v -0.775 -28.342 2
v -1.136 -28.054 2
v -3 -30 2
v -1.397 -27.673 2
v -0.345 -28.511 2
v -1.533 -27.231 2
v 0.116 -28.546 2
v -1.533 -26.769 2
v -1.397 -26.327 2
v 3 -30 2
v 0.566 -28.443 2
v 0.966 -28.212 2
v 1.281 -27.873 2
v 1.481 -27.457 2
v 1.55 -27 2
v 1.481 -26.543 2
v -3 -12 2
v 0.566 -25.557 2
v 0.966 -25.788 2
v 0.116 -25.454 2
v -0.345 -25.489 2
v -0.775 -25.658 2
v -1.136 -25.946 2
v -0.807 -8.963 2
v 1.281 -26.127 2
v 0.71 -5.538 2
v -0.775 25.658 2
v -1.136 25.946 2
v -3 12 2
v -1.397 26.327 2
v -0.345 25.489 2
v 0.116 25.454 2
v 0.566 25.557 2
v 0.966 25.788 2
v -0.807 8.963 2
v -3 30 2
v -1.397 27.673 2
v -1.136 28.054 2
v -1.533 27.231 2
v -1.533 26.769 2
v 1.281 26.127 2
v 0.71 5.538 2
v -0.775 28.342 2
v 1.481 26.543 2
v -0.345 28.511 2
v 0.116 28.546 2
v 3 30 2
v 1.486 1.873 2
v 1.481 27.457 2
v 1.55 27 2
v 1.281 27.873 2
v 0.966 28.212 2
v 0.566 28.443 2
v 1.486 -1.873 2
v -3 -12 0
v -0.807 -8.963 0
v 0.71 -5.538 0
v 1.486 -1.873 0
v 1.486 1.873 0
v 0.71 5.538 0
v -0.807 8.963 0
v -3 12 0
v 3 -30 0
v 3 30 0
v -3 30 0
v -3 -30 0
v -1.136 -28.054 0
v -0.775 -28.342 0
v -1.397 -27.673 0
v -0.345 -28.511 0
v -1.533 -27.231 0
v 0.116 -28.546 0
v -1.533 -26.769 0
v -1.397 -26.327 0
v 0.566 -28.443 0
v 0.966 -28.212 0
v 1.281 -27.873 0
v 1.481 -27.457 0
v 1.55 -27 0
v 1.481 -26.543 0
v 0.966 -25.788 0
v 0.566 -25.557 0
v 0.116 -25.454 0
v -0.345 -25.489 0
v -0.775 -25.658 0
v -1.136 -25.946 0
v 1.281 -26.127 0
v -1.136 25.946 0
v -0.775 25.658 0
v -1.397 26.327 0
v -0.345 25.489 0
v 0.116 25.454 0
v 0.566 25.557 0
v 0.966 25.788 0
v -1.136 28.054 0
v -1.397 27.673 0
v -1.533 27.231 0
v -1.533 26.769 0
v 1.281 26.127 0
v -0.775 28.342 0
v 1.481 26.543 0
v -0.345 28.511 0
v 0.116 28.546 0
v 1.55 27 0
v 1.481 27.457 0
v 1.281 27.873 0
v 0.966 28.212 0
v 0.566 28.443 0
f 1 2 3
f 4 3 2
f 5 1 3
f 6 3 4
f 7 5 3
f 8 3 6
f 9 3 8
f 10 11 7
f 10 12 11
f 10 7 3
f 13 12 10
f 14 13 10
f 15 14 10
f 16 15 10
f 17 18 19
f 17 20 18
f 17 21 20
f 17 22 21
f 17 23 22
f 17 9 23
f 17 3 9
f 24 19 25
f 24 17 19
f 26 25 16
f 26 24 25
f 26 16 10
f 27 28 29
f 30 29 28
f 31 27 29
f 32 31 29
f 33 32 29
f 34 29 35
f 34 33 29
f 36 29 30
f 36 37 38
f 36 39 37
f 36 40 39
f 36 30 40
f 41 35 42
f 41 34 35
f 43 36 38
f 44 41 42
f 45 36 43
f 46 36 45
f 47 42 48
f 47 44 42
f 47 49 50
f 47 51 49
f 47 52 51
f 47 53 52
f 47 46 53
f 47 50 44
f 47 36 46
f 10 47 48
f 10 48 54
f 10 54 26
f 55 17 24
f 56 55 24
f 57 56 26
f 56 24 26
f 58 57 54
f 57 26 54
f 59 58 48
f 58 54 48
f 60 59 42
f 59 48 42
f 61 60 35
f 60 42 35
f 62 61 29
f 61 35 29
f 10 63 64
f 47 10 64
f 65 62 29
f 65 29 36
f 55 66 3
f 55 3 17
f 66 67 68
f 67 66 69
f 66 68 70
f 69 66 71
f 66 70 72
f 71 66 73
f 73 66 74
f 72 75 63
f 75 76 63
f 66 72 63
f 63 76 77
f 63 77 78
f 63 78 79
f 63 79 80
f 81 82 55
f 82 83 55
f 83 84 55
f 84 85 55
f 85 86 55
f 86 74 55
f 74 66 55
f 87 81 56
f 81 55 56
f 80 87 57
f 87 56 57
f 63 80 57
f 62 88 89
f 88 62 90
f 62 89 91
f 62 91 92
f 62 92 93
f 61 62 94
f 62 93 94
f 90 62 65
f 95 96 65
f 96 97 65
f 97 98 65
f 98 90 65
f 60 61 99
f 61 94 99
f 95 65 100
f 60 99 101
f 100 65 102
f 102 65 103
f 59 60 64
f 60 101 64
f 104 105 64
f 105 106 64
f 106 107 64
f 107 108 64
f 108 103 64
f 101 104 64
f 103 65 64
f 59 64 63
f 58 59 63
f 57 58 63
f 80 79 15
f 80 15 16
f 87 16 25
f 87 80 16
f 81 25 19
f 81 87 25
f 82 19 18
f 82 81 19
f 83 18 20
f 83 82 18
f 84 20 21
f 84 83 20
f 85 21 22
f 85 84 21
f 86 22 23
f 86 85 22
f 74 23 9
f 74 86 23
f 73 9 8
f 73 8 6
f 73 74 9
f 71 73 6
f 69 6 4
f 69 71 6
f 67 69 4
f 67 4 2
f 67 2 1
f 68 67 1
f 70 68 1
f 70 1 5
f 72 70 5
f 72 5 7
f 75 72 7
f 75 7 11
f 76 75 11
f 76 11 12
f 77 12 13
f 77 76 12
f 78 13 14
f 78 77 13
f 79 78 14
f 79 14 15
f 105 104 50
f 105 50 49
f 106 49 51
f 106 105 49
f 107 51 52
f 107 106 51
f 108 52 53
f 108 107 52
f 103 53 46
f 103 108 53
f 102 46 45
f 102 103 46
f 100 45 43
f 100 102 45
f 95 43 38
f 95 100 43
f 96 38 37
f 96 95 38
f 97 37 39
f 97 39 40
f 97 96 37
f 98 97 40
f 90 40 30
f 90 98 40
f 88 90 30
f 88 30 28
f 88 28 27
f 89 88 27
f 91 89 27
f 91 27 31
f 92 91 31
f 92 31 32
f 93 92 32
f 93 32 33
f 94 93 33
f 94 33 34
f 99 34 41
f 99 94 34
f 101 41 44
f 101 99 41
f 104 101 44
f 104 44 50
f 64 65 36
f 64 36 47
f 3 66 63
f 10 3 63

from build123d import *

# Parameters (mm, degrees)
SKETCH_1_W          = 6
SKETCH_1_H          = 60
SKETCH_1_R          = 1.55
EXTRUDE_1_DEPTH     = 2
CUT_EXTRUDE_1_DEPTH = 31.215889859


with BuildPart() as part:
    # ｽｹｯﾁ1 → ﾎﾞｽ - 押し出し1 (new body)
    with BuildSketch(Plane.XY):
        Rectangle(SKETCH_1_W, SKETCH_1_H)
        with Locations((0, 27)):
            Circle(SKETCH_1_R, mode=Mode.SUBTRACT)
        with Locations((0, -27)):
            Circle(SKETCH_1_R, mode=Mode.SUBTRACT)
    extrude(amount=EXTRUDE_1_DEPTH)

    # ｽｹｯﾁ2 → ｶｯﾄ - 押し出し1 (cut, through all)
    with BuildSketch(Plane.XY.offset(2)):
        with BuildLine():
            Line((-3, 12), (-3, -12))
            ThreePointArc((-3, -12), (1.583592135, 0), (-3, 12))
        make_face()
    extrude(amount=-CUT_EXTRUDE_1_DEPTH, mode=Mode.SUBTRACT)


solid = part.part
